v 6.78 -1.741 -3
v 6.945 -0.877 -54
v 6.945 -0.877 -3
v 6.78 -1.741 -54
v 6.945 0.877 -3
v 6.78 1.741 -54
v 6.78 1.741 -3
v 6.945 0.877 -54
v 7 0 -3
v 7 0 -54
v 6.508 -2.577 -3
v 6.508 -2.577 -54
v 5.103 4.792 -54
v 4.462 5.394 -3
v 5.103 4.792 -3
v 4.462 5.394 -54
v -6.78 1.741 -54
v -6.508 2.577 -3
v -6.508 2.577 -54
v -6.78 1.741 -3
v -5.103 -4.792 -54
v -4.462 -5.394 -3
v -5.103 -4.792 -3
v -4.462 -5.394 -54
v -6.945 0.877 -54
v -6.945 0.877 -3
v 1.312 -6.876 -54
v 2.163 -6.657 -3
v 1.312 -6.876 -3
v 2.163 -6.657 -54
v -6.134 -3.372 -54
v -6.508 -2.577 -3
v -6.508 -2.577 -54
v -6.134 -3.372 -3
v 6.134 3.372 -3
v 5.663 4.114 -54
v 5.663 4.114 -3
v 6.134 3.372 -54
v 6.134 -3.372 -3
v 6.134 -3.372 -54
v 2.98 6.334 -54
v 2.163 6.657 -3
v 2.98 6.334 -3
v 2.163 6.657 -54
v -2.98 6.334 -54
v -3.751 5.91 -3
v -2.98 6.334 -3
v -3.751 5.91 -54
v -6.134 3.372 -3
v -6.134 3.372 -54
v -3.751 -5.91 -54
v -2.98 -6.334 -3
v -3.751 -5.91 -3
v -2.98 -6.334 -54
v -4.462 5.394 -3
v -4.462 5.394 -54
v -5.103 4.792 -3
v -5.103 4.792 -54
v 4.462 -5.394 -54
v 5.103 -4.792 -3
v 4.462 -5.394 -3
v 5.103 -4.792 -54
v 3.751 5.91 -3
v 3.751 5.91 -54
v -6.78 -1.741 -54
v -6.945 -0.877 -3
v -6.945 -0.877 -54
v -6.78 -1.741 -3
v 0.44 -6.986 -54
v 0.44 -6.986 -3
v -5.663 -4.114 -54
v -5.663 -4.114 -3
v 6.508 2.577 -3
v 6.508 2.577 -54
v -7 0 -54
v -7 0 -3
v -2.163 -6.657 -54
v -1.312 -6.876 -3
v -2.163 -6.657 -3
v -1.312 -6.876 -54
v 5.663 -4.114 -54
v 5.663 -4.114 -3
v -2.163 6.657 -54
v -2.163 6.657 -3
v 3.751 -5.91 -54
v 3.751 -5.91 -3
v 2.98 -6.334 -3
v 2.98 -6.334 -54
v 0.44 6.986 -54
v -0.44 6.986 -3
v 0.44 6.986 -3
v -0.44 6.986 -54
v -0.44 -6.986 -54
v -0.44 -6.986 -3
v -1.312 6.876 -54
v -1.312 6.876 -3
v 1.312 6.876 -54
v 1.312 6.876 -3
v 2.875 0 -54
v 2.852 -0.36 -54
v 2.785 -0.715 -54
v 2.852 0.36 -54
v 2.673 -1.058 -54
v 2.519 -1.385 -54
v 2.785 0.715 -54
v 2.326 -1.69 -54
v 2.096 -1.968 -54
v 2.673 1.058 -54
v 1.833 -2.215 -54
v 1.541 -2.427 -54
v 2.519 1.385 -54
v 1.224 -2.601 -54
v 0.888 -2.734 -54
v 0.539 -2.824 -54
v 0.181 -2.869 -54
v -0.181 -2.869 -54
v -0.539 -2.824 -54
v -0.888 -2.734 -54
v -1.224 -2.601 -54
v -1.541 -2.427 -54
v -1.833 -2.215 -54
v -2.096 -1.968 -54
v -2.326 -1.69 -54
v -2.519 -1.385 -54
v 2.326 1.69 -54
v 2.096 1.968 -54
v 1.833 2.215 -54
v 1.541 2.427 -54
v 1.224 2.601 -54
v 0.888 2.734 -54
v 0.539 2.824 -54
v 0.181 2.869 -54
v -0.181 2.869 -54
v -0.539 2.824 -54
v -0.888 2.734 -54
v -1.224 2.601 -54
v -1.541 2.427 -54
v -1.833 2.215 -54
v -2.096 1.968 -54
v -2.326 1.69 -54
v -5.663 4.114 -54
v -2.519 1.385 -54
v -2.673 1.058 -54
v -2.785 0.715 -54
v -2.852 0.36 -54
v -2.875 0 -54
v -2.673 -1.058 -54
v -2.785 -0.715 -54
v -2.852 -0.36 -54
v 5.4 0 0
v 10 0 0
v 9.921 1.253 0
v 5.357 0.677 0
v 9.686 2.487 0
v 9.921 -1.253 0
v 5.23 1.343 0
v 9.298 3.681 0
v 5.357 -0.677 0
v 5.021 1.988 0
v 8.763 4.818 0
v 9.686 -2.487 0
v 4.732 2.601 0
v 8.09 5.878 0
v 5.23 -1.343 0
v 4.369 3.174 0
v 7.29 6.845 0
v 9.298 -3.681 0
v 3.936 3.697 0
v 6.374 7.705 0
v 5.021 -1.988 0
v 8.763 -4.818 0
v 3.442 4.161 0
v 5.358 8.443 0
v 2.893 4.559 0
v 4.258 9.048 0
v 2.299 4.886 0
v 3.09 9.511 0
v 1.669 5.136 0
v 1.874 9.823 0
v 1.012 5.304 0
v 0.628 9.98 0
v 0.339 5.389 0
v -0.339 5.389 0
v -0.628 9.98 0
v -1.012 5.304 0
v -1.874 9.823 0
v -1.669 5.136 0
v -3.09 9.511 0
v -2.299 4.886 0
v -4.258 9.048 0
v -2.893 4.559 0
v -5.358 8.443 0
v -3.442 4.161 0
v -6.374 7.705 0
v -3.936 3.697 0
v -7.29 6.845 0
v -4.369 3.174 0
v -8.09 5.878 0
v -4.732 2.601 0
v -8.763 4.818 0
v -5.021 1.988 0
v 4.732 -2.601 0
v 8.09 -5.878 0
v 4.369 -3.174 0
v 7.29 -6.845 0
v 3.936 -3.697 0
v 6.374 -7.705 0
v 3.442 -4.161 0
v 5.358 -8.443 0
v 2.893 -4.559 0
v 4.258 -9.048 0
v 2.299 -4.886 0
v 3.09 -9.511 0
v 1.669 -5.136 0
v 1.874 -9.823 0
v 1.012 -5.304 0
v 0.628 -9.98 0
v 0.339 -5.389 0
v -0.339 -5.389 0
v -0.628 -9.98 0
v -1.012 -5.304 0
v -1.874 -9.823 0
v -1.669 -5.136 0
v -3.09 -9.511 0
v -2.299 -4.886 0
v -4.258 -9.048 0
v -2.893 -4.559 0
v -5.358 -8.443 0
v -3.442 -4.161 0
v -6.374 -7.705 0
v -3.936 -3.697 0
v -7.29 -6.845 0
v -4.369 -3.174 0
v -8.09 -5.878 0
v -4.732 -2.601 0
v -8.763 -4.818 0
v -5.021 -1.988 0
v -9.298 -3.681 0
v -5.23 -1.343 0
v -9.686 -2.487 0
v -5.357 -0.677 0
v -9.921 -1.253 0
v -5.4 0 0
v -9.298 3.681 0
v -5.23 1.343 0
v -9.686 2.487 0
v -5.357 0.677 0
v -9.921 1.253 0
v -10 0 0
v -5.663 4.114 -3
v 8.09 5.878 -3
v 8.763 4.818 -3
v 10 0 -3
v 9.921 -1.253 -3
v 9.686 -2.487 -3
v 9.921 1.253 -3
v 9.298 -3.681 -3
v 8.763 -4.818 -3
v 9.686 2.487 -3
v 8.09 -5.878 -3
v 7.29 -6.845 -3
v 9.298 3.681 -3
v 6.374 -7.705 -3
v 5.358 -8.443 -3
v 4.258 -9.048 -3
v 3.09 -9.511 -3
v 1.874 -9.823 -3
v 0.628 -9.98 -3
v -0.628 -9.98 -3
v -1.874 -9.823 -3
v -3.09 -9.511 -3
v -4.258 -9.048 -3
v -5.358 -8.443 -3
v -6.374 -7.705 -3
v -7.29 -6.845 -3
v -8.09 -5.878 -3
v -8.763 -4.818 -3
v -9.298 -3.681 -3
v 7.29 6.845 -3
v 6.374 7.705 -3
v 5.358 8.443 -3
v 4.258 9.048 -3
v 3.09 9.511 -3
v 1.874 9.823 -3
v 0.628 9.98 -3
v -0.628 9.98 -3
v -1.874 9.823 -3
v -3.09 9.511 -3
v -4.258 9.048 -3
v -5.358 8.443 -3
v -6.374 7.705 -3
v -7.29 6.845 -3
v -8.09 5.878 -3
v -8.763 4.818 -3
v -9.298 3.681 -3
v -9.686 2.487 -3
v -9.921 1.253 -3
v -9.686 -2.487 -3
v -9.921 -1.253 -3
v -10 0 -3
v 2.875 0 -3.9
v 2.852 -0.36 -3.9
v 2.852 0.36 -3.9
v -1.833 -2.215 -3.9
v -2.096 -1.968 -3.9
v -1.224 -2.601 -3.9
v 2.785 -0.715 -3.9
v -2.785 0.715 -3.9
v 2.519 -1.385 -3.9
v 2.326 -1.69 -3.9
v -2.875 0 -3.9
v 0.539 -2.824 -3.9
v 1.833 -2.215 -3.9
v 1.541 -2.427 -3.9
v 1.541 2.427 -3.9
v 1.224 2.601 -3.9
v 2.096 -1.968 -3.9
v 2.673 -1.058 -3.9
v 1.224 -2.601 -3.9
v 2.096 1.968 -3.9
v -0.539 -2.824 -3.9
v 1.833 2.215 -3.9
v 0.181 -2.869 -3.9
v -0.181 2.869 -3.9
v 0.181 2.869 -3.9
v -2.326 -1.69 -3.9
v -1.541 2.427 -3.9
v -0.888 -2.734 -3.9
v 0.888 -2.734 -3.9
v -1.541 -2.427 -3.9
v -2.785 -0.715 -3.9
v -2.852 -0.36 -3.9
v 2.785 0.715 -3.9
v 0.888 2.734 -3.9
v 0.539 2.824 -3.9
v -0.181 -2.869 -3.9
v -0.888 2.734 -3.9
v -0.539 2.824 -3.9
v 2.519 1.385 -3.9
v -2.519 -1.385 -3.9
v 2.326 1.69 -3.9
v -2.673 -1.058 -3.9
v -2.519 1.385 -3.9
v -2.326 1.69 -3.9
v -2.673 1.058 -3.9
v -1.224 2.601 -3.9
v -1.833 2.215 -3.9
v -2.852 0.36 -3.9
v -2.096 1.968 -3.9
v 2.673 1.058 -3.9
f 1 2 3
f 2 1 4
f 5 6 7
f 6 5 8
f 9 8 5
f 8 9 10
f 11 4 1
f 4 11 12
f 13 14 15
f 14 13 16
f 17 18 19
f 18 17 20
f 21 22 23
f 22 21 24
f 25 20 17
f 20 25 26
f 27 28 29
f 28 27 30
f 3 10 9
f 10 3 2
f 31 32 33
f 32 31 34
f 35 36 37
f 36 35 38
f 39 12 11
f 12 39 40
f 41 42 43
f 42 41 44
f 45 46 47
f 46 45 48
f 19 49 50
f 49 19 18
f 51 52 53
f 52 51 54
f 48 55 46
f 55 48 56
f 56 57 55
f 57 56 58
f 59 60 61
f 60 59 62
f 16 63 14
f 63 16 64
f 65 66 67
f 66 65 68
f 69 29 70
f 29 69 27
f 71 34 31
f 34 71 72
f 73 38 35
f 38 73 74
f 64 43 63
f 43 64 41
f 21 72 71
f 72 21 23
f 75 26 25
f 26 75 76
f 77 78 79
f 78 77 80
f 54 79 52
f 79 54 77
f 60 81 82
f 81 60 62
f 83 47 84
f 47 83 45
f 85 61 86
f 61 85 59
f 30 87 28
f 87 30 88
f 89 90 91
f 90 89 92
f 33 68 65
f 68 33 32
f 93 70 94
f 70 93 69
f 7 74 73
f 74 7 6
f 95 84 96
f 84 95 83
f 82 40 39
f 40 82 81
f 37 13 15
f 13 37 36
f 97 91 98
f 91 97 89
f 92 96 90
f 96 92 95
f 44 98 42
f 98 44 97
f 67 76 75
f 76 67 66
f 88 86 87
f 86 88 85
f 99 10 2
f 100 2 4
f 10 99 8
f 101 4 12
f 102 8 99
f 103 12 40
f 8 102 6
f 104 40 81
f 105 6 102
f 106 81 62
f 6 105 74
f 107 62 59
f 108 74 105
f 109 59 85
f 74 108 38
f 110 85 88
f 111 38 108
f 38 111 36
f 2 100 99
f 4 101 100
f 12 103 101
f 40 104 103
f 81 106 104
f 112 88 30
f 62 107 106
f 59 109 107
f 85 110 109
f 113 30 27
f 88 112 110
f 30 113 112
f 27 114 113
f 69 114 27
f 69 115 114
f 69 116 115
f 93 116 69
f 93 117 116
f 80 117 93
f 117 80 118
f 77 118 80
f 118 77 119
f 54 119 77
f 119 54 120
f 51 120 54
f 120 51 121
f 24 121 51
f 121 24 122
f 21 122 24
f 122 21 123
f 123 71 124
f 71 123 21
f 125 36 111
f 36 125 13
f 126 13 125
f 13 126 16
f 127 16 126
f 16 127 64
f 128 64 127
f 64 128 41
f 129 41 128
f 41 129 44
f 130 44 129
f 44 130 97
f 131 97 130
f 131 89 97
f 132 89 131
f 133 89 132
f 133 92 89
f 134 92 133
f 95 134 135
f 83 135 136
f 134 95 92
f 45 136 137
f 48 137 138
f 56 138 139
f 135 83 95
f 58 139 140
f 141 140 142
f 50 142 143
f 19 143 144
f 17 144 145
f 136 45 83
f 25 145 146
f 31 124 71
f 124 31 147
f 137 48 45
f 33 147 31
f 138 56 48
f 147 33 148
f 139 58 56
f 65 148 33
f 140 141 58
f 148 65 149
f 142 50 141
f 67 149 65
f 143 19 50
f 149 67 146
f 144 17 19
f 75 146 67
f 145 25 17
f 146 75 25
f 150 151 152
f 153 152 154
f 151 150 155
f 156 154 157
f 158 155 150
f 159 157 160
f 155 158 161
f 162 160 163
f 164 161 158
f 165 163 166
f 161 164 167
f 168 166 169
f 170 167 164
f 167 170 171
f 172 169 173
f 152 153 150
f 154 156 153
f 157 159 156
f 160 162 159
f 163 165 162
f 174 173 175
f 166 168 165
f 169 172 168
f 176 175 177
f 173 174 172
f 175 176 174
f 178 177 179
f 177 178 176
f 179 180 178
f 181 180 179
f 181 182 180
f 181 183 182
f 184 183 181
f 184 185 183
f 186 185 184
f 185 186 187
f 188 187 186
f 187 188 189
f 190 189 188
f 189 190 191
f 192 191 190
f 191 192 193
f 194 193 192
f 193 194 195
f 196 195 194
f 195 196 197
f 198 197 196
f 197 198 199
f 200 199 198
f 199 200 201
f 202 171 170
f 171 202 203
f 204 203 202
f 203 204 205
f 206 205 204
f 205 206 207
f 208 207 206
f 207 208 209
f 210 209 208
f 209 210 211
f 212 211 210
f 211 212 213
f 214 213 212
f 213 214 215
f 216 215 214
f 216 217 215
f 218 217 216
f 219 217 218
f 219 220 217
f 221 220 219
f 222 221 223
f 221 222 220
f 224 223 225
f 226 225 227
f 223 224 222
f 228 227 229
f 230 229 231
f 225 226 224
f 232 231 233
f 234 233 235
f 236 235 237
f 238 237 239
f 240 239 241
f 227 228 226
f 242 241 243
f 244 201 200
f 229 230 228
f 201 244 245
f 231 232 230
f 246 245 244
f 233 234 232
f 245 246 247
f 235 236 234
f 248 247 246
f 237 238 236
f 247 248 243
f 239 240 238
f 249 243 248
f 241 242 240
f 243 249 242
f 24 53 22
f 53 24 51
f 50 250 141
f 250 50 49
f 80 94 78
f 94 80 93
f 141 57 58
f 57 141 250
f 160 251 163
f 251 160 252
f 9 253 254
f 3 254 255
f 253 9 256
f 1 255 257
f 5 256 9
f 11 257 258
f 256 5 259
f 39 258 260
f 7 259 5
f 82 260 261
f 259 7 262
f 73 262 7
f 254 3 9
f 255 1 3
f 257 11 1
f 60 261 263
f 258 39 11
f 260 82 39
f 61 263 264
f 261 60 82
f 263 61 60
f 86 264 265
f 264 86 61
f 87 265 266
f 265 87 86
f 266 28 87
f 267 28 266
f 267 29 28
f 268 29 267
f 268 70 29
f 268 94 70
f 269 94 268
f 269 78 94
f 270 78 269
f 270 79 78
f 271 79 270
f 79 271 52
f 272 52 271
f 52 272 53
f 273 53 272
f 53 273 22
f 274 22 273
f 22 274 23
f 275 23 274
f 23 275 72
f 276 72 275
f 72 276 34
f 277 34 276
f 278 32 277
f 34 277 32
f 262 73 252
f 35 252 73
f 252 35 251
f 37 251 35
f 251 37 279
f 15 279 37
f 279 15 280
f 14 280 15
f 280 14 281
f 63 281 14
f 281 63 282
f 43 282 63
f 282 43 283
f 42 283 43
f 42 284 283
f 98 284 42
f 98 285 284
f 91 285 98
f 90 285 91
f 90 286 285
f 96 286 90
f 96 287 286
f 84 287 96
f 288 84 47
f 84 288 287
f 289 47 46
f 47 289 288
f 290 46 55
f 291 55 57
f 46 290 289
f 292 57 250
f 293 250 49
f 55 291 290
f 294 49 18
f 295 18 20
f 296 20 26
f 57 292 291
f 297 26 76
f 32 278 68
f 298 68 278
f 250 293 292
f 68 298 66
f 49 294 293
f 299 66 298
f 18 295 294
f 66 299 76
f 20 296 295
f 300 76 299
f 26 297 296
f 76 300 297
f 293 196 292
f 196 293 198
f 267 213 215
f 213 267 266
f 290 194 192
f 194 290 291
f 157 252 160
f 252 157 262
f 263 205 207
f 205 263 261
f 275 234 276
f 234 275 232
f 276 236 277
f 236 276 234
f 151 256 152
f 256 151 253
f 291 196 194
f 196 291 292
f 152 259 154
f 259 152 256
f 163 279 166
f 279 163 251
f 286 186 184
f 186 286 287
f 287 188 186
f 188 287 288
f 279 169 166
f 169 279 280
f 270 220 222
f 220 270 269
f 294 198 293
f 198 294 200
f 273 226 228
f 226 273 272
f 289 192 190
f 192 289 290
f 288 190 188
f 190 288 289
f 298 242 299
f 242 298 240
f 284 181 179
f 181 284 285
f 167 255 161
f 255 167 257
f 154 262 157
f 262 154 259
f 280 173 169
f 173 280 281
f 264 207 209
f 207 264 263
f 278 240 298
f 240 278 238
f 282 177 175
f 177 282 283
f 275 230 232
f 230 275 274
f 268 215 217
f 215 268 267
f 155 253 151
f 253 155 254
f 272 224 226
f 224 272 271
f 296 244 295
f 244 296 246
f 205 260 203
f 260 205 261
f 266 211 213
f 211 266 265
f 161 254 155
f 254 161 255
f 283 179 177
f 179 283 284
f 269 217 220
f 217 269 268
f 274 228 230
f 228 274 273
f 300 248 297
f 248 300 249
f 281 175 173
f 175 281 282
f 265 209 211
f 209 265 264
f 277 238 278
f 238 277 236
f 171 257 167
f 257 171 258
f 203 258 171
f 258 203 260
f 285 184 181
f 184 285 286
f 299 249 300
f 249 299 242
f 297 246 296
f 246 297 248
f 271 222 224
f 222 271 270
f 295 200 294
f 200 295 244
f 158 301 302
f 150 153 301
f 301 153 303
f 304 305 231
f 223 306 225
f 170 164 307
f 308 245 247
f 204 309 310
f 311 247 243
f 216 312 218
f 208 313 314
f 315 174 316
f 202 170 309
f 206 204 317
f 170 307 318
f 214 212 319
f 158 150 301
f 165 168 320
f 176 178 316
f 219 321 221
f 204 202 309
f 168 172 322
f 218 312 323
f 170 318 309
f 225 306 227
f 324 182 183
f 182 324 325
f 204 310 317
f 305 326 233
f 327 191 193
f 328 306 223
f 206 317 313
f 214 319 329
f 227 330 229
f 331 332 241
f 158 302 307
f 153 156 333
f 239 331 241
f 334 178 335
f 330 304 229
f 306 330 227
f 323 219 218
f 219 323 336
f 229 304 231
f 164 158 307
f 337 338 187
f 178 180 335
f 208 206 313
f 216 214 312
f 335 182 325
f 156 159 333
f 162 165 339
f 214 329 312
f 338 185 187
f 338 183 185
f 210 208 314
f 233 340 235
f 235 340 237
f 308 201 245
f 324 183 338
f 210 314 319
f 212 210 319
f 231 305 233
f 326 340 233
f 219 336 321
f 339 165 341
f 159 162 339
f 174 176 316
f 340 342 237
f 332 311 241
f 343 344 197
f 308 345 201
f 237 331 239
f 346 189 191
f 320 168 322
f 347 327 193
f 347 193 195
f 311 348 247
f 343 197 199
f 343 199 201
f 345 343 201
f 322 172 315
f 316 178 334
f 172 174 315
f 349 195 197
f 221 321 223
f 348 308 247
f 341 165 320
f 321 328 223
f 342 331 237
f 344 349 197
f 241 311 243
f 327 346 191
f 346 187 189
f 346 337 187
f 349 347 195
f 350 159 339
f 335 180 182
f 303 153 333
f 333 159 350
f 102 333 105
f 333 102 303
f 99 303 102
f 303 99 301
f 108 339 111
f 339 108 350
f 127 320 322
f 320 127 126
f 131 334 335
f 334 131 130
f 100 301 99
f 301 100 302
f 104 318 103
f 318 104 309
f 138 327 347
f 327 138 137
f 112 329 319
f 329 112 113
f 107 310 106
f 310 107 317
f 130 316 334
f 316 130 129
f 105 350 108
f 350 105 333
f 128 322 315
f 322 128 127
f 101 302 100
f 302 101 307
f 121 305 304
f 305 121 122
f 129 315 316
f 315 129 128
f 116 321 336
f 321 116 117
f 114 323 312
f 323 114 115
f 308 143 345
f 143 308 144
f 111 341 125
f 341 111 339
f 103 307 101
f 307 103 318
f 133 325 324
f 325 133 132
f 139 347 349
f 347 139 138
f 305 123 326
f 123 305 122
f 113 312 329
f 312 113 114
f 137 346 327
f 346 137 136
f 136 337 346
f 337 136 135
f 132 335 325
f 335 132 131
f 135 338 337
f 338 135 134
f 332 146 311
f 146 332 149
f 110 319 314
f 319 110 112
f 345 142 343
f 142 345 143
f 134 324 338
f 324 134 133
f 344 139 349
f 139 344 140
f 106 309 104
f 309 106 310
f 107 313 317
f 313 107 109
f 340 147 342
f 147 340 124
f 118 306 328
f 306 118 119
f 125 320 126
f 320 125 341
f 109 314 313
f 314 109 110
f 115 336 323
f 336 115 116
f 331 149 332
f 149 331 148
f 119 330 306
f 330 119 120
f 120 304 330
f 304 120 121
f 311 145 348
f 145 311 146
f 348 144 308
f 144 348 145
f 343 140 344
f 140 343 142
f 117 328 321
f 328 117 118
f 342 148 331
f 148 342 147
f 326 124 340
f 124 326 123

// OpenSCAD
$fn = 50;


difference() {
	union() {
		translate(v = [0, 0, -54.0000000000]) {
			cylinder(h = 54, r = 7.0000000000);
		}
		translate(v = [0, 0, -3.0000000000]) {
			cylinder(h = 3, r = 10.0000000000);
		}
	}
	union() {
		translate(v = [0, 0, 0]) {
			rotate(a = [0, 0, 0]) {
				difference() {
					union() {
						#translate(v = [0, 0, -54.0000000000]) {
							cylinder(h = 54, r = 2.6000000000);
						}
						#translate(v = [0, 0, -3.9000000000]) {
							cylinder(h = 3.9000000000, r1 = 2.8750000000, r2 = 5.4000000000);
						}
						#translate(v = [0, 0, -54.0000000000]) {
							cylinder(h = 54, r = 2.8750000000);
						}
						#translate(v = [0, 0, -54.0000000000]) {
							cylinder(h = 54, r = 2.6000000000);
						}
					}
					union();
				}
			}
		}
	}
}
